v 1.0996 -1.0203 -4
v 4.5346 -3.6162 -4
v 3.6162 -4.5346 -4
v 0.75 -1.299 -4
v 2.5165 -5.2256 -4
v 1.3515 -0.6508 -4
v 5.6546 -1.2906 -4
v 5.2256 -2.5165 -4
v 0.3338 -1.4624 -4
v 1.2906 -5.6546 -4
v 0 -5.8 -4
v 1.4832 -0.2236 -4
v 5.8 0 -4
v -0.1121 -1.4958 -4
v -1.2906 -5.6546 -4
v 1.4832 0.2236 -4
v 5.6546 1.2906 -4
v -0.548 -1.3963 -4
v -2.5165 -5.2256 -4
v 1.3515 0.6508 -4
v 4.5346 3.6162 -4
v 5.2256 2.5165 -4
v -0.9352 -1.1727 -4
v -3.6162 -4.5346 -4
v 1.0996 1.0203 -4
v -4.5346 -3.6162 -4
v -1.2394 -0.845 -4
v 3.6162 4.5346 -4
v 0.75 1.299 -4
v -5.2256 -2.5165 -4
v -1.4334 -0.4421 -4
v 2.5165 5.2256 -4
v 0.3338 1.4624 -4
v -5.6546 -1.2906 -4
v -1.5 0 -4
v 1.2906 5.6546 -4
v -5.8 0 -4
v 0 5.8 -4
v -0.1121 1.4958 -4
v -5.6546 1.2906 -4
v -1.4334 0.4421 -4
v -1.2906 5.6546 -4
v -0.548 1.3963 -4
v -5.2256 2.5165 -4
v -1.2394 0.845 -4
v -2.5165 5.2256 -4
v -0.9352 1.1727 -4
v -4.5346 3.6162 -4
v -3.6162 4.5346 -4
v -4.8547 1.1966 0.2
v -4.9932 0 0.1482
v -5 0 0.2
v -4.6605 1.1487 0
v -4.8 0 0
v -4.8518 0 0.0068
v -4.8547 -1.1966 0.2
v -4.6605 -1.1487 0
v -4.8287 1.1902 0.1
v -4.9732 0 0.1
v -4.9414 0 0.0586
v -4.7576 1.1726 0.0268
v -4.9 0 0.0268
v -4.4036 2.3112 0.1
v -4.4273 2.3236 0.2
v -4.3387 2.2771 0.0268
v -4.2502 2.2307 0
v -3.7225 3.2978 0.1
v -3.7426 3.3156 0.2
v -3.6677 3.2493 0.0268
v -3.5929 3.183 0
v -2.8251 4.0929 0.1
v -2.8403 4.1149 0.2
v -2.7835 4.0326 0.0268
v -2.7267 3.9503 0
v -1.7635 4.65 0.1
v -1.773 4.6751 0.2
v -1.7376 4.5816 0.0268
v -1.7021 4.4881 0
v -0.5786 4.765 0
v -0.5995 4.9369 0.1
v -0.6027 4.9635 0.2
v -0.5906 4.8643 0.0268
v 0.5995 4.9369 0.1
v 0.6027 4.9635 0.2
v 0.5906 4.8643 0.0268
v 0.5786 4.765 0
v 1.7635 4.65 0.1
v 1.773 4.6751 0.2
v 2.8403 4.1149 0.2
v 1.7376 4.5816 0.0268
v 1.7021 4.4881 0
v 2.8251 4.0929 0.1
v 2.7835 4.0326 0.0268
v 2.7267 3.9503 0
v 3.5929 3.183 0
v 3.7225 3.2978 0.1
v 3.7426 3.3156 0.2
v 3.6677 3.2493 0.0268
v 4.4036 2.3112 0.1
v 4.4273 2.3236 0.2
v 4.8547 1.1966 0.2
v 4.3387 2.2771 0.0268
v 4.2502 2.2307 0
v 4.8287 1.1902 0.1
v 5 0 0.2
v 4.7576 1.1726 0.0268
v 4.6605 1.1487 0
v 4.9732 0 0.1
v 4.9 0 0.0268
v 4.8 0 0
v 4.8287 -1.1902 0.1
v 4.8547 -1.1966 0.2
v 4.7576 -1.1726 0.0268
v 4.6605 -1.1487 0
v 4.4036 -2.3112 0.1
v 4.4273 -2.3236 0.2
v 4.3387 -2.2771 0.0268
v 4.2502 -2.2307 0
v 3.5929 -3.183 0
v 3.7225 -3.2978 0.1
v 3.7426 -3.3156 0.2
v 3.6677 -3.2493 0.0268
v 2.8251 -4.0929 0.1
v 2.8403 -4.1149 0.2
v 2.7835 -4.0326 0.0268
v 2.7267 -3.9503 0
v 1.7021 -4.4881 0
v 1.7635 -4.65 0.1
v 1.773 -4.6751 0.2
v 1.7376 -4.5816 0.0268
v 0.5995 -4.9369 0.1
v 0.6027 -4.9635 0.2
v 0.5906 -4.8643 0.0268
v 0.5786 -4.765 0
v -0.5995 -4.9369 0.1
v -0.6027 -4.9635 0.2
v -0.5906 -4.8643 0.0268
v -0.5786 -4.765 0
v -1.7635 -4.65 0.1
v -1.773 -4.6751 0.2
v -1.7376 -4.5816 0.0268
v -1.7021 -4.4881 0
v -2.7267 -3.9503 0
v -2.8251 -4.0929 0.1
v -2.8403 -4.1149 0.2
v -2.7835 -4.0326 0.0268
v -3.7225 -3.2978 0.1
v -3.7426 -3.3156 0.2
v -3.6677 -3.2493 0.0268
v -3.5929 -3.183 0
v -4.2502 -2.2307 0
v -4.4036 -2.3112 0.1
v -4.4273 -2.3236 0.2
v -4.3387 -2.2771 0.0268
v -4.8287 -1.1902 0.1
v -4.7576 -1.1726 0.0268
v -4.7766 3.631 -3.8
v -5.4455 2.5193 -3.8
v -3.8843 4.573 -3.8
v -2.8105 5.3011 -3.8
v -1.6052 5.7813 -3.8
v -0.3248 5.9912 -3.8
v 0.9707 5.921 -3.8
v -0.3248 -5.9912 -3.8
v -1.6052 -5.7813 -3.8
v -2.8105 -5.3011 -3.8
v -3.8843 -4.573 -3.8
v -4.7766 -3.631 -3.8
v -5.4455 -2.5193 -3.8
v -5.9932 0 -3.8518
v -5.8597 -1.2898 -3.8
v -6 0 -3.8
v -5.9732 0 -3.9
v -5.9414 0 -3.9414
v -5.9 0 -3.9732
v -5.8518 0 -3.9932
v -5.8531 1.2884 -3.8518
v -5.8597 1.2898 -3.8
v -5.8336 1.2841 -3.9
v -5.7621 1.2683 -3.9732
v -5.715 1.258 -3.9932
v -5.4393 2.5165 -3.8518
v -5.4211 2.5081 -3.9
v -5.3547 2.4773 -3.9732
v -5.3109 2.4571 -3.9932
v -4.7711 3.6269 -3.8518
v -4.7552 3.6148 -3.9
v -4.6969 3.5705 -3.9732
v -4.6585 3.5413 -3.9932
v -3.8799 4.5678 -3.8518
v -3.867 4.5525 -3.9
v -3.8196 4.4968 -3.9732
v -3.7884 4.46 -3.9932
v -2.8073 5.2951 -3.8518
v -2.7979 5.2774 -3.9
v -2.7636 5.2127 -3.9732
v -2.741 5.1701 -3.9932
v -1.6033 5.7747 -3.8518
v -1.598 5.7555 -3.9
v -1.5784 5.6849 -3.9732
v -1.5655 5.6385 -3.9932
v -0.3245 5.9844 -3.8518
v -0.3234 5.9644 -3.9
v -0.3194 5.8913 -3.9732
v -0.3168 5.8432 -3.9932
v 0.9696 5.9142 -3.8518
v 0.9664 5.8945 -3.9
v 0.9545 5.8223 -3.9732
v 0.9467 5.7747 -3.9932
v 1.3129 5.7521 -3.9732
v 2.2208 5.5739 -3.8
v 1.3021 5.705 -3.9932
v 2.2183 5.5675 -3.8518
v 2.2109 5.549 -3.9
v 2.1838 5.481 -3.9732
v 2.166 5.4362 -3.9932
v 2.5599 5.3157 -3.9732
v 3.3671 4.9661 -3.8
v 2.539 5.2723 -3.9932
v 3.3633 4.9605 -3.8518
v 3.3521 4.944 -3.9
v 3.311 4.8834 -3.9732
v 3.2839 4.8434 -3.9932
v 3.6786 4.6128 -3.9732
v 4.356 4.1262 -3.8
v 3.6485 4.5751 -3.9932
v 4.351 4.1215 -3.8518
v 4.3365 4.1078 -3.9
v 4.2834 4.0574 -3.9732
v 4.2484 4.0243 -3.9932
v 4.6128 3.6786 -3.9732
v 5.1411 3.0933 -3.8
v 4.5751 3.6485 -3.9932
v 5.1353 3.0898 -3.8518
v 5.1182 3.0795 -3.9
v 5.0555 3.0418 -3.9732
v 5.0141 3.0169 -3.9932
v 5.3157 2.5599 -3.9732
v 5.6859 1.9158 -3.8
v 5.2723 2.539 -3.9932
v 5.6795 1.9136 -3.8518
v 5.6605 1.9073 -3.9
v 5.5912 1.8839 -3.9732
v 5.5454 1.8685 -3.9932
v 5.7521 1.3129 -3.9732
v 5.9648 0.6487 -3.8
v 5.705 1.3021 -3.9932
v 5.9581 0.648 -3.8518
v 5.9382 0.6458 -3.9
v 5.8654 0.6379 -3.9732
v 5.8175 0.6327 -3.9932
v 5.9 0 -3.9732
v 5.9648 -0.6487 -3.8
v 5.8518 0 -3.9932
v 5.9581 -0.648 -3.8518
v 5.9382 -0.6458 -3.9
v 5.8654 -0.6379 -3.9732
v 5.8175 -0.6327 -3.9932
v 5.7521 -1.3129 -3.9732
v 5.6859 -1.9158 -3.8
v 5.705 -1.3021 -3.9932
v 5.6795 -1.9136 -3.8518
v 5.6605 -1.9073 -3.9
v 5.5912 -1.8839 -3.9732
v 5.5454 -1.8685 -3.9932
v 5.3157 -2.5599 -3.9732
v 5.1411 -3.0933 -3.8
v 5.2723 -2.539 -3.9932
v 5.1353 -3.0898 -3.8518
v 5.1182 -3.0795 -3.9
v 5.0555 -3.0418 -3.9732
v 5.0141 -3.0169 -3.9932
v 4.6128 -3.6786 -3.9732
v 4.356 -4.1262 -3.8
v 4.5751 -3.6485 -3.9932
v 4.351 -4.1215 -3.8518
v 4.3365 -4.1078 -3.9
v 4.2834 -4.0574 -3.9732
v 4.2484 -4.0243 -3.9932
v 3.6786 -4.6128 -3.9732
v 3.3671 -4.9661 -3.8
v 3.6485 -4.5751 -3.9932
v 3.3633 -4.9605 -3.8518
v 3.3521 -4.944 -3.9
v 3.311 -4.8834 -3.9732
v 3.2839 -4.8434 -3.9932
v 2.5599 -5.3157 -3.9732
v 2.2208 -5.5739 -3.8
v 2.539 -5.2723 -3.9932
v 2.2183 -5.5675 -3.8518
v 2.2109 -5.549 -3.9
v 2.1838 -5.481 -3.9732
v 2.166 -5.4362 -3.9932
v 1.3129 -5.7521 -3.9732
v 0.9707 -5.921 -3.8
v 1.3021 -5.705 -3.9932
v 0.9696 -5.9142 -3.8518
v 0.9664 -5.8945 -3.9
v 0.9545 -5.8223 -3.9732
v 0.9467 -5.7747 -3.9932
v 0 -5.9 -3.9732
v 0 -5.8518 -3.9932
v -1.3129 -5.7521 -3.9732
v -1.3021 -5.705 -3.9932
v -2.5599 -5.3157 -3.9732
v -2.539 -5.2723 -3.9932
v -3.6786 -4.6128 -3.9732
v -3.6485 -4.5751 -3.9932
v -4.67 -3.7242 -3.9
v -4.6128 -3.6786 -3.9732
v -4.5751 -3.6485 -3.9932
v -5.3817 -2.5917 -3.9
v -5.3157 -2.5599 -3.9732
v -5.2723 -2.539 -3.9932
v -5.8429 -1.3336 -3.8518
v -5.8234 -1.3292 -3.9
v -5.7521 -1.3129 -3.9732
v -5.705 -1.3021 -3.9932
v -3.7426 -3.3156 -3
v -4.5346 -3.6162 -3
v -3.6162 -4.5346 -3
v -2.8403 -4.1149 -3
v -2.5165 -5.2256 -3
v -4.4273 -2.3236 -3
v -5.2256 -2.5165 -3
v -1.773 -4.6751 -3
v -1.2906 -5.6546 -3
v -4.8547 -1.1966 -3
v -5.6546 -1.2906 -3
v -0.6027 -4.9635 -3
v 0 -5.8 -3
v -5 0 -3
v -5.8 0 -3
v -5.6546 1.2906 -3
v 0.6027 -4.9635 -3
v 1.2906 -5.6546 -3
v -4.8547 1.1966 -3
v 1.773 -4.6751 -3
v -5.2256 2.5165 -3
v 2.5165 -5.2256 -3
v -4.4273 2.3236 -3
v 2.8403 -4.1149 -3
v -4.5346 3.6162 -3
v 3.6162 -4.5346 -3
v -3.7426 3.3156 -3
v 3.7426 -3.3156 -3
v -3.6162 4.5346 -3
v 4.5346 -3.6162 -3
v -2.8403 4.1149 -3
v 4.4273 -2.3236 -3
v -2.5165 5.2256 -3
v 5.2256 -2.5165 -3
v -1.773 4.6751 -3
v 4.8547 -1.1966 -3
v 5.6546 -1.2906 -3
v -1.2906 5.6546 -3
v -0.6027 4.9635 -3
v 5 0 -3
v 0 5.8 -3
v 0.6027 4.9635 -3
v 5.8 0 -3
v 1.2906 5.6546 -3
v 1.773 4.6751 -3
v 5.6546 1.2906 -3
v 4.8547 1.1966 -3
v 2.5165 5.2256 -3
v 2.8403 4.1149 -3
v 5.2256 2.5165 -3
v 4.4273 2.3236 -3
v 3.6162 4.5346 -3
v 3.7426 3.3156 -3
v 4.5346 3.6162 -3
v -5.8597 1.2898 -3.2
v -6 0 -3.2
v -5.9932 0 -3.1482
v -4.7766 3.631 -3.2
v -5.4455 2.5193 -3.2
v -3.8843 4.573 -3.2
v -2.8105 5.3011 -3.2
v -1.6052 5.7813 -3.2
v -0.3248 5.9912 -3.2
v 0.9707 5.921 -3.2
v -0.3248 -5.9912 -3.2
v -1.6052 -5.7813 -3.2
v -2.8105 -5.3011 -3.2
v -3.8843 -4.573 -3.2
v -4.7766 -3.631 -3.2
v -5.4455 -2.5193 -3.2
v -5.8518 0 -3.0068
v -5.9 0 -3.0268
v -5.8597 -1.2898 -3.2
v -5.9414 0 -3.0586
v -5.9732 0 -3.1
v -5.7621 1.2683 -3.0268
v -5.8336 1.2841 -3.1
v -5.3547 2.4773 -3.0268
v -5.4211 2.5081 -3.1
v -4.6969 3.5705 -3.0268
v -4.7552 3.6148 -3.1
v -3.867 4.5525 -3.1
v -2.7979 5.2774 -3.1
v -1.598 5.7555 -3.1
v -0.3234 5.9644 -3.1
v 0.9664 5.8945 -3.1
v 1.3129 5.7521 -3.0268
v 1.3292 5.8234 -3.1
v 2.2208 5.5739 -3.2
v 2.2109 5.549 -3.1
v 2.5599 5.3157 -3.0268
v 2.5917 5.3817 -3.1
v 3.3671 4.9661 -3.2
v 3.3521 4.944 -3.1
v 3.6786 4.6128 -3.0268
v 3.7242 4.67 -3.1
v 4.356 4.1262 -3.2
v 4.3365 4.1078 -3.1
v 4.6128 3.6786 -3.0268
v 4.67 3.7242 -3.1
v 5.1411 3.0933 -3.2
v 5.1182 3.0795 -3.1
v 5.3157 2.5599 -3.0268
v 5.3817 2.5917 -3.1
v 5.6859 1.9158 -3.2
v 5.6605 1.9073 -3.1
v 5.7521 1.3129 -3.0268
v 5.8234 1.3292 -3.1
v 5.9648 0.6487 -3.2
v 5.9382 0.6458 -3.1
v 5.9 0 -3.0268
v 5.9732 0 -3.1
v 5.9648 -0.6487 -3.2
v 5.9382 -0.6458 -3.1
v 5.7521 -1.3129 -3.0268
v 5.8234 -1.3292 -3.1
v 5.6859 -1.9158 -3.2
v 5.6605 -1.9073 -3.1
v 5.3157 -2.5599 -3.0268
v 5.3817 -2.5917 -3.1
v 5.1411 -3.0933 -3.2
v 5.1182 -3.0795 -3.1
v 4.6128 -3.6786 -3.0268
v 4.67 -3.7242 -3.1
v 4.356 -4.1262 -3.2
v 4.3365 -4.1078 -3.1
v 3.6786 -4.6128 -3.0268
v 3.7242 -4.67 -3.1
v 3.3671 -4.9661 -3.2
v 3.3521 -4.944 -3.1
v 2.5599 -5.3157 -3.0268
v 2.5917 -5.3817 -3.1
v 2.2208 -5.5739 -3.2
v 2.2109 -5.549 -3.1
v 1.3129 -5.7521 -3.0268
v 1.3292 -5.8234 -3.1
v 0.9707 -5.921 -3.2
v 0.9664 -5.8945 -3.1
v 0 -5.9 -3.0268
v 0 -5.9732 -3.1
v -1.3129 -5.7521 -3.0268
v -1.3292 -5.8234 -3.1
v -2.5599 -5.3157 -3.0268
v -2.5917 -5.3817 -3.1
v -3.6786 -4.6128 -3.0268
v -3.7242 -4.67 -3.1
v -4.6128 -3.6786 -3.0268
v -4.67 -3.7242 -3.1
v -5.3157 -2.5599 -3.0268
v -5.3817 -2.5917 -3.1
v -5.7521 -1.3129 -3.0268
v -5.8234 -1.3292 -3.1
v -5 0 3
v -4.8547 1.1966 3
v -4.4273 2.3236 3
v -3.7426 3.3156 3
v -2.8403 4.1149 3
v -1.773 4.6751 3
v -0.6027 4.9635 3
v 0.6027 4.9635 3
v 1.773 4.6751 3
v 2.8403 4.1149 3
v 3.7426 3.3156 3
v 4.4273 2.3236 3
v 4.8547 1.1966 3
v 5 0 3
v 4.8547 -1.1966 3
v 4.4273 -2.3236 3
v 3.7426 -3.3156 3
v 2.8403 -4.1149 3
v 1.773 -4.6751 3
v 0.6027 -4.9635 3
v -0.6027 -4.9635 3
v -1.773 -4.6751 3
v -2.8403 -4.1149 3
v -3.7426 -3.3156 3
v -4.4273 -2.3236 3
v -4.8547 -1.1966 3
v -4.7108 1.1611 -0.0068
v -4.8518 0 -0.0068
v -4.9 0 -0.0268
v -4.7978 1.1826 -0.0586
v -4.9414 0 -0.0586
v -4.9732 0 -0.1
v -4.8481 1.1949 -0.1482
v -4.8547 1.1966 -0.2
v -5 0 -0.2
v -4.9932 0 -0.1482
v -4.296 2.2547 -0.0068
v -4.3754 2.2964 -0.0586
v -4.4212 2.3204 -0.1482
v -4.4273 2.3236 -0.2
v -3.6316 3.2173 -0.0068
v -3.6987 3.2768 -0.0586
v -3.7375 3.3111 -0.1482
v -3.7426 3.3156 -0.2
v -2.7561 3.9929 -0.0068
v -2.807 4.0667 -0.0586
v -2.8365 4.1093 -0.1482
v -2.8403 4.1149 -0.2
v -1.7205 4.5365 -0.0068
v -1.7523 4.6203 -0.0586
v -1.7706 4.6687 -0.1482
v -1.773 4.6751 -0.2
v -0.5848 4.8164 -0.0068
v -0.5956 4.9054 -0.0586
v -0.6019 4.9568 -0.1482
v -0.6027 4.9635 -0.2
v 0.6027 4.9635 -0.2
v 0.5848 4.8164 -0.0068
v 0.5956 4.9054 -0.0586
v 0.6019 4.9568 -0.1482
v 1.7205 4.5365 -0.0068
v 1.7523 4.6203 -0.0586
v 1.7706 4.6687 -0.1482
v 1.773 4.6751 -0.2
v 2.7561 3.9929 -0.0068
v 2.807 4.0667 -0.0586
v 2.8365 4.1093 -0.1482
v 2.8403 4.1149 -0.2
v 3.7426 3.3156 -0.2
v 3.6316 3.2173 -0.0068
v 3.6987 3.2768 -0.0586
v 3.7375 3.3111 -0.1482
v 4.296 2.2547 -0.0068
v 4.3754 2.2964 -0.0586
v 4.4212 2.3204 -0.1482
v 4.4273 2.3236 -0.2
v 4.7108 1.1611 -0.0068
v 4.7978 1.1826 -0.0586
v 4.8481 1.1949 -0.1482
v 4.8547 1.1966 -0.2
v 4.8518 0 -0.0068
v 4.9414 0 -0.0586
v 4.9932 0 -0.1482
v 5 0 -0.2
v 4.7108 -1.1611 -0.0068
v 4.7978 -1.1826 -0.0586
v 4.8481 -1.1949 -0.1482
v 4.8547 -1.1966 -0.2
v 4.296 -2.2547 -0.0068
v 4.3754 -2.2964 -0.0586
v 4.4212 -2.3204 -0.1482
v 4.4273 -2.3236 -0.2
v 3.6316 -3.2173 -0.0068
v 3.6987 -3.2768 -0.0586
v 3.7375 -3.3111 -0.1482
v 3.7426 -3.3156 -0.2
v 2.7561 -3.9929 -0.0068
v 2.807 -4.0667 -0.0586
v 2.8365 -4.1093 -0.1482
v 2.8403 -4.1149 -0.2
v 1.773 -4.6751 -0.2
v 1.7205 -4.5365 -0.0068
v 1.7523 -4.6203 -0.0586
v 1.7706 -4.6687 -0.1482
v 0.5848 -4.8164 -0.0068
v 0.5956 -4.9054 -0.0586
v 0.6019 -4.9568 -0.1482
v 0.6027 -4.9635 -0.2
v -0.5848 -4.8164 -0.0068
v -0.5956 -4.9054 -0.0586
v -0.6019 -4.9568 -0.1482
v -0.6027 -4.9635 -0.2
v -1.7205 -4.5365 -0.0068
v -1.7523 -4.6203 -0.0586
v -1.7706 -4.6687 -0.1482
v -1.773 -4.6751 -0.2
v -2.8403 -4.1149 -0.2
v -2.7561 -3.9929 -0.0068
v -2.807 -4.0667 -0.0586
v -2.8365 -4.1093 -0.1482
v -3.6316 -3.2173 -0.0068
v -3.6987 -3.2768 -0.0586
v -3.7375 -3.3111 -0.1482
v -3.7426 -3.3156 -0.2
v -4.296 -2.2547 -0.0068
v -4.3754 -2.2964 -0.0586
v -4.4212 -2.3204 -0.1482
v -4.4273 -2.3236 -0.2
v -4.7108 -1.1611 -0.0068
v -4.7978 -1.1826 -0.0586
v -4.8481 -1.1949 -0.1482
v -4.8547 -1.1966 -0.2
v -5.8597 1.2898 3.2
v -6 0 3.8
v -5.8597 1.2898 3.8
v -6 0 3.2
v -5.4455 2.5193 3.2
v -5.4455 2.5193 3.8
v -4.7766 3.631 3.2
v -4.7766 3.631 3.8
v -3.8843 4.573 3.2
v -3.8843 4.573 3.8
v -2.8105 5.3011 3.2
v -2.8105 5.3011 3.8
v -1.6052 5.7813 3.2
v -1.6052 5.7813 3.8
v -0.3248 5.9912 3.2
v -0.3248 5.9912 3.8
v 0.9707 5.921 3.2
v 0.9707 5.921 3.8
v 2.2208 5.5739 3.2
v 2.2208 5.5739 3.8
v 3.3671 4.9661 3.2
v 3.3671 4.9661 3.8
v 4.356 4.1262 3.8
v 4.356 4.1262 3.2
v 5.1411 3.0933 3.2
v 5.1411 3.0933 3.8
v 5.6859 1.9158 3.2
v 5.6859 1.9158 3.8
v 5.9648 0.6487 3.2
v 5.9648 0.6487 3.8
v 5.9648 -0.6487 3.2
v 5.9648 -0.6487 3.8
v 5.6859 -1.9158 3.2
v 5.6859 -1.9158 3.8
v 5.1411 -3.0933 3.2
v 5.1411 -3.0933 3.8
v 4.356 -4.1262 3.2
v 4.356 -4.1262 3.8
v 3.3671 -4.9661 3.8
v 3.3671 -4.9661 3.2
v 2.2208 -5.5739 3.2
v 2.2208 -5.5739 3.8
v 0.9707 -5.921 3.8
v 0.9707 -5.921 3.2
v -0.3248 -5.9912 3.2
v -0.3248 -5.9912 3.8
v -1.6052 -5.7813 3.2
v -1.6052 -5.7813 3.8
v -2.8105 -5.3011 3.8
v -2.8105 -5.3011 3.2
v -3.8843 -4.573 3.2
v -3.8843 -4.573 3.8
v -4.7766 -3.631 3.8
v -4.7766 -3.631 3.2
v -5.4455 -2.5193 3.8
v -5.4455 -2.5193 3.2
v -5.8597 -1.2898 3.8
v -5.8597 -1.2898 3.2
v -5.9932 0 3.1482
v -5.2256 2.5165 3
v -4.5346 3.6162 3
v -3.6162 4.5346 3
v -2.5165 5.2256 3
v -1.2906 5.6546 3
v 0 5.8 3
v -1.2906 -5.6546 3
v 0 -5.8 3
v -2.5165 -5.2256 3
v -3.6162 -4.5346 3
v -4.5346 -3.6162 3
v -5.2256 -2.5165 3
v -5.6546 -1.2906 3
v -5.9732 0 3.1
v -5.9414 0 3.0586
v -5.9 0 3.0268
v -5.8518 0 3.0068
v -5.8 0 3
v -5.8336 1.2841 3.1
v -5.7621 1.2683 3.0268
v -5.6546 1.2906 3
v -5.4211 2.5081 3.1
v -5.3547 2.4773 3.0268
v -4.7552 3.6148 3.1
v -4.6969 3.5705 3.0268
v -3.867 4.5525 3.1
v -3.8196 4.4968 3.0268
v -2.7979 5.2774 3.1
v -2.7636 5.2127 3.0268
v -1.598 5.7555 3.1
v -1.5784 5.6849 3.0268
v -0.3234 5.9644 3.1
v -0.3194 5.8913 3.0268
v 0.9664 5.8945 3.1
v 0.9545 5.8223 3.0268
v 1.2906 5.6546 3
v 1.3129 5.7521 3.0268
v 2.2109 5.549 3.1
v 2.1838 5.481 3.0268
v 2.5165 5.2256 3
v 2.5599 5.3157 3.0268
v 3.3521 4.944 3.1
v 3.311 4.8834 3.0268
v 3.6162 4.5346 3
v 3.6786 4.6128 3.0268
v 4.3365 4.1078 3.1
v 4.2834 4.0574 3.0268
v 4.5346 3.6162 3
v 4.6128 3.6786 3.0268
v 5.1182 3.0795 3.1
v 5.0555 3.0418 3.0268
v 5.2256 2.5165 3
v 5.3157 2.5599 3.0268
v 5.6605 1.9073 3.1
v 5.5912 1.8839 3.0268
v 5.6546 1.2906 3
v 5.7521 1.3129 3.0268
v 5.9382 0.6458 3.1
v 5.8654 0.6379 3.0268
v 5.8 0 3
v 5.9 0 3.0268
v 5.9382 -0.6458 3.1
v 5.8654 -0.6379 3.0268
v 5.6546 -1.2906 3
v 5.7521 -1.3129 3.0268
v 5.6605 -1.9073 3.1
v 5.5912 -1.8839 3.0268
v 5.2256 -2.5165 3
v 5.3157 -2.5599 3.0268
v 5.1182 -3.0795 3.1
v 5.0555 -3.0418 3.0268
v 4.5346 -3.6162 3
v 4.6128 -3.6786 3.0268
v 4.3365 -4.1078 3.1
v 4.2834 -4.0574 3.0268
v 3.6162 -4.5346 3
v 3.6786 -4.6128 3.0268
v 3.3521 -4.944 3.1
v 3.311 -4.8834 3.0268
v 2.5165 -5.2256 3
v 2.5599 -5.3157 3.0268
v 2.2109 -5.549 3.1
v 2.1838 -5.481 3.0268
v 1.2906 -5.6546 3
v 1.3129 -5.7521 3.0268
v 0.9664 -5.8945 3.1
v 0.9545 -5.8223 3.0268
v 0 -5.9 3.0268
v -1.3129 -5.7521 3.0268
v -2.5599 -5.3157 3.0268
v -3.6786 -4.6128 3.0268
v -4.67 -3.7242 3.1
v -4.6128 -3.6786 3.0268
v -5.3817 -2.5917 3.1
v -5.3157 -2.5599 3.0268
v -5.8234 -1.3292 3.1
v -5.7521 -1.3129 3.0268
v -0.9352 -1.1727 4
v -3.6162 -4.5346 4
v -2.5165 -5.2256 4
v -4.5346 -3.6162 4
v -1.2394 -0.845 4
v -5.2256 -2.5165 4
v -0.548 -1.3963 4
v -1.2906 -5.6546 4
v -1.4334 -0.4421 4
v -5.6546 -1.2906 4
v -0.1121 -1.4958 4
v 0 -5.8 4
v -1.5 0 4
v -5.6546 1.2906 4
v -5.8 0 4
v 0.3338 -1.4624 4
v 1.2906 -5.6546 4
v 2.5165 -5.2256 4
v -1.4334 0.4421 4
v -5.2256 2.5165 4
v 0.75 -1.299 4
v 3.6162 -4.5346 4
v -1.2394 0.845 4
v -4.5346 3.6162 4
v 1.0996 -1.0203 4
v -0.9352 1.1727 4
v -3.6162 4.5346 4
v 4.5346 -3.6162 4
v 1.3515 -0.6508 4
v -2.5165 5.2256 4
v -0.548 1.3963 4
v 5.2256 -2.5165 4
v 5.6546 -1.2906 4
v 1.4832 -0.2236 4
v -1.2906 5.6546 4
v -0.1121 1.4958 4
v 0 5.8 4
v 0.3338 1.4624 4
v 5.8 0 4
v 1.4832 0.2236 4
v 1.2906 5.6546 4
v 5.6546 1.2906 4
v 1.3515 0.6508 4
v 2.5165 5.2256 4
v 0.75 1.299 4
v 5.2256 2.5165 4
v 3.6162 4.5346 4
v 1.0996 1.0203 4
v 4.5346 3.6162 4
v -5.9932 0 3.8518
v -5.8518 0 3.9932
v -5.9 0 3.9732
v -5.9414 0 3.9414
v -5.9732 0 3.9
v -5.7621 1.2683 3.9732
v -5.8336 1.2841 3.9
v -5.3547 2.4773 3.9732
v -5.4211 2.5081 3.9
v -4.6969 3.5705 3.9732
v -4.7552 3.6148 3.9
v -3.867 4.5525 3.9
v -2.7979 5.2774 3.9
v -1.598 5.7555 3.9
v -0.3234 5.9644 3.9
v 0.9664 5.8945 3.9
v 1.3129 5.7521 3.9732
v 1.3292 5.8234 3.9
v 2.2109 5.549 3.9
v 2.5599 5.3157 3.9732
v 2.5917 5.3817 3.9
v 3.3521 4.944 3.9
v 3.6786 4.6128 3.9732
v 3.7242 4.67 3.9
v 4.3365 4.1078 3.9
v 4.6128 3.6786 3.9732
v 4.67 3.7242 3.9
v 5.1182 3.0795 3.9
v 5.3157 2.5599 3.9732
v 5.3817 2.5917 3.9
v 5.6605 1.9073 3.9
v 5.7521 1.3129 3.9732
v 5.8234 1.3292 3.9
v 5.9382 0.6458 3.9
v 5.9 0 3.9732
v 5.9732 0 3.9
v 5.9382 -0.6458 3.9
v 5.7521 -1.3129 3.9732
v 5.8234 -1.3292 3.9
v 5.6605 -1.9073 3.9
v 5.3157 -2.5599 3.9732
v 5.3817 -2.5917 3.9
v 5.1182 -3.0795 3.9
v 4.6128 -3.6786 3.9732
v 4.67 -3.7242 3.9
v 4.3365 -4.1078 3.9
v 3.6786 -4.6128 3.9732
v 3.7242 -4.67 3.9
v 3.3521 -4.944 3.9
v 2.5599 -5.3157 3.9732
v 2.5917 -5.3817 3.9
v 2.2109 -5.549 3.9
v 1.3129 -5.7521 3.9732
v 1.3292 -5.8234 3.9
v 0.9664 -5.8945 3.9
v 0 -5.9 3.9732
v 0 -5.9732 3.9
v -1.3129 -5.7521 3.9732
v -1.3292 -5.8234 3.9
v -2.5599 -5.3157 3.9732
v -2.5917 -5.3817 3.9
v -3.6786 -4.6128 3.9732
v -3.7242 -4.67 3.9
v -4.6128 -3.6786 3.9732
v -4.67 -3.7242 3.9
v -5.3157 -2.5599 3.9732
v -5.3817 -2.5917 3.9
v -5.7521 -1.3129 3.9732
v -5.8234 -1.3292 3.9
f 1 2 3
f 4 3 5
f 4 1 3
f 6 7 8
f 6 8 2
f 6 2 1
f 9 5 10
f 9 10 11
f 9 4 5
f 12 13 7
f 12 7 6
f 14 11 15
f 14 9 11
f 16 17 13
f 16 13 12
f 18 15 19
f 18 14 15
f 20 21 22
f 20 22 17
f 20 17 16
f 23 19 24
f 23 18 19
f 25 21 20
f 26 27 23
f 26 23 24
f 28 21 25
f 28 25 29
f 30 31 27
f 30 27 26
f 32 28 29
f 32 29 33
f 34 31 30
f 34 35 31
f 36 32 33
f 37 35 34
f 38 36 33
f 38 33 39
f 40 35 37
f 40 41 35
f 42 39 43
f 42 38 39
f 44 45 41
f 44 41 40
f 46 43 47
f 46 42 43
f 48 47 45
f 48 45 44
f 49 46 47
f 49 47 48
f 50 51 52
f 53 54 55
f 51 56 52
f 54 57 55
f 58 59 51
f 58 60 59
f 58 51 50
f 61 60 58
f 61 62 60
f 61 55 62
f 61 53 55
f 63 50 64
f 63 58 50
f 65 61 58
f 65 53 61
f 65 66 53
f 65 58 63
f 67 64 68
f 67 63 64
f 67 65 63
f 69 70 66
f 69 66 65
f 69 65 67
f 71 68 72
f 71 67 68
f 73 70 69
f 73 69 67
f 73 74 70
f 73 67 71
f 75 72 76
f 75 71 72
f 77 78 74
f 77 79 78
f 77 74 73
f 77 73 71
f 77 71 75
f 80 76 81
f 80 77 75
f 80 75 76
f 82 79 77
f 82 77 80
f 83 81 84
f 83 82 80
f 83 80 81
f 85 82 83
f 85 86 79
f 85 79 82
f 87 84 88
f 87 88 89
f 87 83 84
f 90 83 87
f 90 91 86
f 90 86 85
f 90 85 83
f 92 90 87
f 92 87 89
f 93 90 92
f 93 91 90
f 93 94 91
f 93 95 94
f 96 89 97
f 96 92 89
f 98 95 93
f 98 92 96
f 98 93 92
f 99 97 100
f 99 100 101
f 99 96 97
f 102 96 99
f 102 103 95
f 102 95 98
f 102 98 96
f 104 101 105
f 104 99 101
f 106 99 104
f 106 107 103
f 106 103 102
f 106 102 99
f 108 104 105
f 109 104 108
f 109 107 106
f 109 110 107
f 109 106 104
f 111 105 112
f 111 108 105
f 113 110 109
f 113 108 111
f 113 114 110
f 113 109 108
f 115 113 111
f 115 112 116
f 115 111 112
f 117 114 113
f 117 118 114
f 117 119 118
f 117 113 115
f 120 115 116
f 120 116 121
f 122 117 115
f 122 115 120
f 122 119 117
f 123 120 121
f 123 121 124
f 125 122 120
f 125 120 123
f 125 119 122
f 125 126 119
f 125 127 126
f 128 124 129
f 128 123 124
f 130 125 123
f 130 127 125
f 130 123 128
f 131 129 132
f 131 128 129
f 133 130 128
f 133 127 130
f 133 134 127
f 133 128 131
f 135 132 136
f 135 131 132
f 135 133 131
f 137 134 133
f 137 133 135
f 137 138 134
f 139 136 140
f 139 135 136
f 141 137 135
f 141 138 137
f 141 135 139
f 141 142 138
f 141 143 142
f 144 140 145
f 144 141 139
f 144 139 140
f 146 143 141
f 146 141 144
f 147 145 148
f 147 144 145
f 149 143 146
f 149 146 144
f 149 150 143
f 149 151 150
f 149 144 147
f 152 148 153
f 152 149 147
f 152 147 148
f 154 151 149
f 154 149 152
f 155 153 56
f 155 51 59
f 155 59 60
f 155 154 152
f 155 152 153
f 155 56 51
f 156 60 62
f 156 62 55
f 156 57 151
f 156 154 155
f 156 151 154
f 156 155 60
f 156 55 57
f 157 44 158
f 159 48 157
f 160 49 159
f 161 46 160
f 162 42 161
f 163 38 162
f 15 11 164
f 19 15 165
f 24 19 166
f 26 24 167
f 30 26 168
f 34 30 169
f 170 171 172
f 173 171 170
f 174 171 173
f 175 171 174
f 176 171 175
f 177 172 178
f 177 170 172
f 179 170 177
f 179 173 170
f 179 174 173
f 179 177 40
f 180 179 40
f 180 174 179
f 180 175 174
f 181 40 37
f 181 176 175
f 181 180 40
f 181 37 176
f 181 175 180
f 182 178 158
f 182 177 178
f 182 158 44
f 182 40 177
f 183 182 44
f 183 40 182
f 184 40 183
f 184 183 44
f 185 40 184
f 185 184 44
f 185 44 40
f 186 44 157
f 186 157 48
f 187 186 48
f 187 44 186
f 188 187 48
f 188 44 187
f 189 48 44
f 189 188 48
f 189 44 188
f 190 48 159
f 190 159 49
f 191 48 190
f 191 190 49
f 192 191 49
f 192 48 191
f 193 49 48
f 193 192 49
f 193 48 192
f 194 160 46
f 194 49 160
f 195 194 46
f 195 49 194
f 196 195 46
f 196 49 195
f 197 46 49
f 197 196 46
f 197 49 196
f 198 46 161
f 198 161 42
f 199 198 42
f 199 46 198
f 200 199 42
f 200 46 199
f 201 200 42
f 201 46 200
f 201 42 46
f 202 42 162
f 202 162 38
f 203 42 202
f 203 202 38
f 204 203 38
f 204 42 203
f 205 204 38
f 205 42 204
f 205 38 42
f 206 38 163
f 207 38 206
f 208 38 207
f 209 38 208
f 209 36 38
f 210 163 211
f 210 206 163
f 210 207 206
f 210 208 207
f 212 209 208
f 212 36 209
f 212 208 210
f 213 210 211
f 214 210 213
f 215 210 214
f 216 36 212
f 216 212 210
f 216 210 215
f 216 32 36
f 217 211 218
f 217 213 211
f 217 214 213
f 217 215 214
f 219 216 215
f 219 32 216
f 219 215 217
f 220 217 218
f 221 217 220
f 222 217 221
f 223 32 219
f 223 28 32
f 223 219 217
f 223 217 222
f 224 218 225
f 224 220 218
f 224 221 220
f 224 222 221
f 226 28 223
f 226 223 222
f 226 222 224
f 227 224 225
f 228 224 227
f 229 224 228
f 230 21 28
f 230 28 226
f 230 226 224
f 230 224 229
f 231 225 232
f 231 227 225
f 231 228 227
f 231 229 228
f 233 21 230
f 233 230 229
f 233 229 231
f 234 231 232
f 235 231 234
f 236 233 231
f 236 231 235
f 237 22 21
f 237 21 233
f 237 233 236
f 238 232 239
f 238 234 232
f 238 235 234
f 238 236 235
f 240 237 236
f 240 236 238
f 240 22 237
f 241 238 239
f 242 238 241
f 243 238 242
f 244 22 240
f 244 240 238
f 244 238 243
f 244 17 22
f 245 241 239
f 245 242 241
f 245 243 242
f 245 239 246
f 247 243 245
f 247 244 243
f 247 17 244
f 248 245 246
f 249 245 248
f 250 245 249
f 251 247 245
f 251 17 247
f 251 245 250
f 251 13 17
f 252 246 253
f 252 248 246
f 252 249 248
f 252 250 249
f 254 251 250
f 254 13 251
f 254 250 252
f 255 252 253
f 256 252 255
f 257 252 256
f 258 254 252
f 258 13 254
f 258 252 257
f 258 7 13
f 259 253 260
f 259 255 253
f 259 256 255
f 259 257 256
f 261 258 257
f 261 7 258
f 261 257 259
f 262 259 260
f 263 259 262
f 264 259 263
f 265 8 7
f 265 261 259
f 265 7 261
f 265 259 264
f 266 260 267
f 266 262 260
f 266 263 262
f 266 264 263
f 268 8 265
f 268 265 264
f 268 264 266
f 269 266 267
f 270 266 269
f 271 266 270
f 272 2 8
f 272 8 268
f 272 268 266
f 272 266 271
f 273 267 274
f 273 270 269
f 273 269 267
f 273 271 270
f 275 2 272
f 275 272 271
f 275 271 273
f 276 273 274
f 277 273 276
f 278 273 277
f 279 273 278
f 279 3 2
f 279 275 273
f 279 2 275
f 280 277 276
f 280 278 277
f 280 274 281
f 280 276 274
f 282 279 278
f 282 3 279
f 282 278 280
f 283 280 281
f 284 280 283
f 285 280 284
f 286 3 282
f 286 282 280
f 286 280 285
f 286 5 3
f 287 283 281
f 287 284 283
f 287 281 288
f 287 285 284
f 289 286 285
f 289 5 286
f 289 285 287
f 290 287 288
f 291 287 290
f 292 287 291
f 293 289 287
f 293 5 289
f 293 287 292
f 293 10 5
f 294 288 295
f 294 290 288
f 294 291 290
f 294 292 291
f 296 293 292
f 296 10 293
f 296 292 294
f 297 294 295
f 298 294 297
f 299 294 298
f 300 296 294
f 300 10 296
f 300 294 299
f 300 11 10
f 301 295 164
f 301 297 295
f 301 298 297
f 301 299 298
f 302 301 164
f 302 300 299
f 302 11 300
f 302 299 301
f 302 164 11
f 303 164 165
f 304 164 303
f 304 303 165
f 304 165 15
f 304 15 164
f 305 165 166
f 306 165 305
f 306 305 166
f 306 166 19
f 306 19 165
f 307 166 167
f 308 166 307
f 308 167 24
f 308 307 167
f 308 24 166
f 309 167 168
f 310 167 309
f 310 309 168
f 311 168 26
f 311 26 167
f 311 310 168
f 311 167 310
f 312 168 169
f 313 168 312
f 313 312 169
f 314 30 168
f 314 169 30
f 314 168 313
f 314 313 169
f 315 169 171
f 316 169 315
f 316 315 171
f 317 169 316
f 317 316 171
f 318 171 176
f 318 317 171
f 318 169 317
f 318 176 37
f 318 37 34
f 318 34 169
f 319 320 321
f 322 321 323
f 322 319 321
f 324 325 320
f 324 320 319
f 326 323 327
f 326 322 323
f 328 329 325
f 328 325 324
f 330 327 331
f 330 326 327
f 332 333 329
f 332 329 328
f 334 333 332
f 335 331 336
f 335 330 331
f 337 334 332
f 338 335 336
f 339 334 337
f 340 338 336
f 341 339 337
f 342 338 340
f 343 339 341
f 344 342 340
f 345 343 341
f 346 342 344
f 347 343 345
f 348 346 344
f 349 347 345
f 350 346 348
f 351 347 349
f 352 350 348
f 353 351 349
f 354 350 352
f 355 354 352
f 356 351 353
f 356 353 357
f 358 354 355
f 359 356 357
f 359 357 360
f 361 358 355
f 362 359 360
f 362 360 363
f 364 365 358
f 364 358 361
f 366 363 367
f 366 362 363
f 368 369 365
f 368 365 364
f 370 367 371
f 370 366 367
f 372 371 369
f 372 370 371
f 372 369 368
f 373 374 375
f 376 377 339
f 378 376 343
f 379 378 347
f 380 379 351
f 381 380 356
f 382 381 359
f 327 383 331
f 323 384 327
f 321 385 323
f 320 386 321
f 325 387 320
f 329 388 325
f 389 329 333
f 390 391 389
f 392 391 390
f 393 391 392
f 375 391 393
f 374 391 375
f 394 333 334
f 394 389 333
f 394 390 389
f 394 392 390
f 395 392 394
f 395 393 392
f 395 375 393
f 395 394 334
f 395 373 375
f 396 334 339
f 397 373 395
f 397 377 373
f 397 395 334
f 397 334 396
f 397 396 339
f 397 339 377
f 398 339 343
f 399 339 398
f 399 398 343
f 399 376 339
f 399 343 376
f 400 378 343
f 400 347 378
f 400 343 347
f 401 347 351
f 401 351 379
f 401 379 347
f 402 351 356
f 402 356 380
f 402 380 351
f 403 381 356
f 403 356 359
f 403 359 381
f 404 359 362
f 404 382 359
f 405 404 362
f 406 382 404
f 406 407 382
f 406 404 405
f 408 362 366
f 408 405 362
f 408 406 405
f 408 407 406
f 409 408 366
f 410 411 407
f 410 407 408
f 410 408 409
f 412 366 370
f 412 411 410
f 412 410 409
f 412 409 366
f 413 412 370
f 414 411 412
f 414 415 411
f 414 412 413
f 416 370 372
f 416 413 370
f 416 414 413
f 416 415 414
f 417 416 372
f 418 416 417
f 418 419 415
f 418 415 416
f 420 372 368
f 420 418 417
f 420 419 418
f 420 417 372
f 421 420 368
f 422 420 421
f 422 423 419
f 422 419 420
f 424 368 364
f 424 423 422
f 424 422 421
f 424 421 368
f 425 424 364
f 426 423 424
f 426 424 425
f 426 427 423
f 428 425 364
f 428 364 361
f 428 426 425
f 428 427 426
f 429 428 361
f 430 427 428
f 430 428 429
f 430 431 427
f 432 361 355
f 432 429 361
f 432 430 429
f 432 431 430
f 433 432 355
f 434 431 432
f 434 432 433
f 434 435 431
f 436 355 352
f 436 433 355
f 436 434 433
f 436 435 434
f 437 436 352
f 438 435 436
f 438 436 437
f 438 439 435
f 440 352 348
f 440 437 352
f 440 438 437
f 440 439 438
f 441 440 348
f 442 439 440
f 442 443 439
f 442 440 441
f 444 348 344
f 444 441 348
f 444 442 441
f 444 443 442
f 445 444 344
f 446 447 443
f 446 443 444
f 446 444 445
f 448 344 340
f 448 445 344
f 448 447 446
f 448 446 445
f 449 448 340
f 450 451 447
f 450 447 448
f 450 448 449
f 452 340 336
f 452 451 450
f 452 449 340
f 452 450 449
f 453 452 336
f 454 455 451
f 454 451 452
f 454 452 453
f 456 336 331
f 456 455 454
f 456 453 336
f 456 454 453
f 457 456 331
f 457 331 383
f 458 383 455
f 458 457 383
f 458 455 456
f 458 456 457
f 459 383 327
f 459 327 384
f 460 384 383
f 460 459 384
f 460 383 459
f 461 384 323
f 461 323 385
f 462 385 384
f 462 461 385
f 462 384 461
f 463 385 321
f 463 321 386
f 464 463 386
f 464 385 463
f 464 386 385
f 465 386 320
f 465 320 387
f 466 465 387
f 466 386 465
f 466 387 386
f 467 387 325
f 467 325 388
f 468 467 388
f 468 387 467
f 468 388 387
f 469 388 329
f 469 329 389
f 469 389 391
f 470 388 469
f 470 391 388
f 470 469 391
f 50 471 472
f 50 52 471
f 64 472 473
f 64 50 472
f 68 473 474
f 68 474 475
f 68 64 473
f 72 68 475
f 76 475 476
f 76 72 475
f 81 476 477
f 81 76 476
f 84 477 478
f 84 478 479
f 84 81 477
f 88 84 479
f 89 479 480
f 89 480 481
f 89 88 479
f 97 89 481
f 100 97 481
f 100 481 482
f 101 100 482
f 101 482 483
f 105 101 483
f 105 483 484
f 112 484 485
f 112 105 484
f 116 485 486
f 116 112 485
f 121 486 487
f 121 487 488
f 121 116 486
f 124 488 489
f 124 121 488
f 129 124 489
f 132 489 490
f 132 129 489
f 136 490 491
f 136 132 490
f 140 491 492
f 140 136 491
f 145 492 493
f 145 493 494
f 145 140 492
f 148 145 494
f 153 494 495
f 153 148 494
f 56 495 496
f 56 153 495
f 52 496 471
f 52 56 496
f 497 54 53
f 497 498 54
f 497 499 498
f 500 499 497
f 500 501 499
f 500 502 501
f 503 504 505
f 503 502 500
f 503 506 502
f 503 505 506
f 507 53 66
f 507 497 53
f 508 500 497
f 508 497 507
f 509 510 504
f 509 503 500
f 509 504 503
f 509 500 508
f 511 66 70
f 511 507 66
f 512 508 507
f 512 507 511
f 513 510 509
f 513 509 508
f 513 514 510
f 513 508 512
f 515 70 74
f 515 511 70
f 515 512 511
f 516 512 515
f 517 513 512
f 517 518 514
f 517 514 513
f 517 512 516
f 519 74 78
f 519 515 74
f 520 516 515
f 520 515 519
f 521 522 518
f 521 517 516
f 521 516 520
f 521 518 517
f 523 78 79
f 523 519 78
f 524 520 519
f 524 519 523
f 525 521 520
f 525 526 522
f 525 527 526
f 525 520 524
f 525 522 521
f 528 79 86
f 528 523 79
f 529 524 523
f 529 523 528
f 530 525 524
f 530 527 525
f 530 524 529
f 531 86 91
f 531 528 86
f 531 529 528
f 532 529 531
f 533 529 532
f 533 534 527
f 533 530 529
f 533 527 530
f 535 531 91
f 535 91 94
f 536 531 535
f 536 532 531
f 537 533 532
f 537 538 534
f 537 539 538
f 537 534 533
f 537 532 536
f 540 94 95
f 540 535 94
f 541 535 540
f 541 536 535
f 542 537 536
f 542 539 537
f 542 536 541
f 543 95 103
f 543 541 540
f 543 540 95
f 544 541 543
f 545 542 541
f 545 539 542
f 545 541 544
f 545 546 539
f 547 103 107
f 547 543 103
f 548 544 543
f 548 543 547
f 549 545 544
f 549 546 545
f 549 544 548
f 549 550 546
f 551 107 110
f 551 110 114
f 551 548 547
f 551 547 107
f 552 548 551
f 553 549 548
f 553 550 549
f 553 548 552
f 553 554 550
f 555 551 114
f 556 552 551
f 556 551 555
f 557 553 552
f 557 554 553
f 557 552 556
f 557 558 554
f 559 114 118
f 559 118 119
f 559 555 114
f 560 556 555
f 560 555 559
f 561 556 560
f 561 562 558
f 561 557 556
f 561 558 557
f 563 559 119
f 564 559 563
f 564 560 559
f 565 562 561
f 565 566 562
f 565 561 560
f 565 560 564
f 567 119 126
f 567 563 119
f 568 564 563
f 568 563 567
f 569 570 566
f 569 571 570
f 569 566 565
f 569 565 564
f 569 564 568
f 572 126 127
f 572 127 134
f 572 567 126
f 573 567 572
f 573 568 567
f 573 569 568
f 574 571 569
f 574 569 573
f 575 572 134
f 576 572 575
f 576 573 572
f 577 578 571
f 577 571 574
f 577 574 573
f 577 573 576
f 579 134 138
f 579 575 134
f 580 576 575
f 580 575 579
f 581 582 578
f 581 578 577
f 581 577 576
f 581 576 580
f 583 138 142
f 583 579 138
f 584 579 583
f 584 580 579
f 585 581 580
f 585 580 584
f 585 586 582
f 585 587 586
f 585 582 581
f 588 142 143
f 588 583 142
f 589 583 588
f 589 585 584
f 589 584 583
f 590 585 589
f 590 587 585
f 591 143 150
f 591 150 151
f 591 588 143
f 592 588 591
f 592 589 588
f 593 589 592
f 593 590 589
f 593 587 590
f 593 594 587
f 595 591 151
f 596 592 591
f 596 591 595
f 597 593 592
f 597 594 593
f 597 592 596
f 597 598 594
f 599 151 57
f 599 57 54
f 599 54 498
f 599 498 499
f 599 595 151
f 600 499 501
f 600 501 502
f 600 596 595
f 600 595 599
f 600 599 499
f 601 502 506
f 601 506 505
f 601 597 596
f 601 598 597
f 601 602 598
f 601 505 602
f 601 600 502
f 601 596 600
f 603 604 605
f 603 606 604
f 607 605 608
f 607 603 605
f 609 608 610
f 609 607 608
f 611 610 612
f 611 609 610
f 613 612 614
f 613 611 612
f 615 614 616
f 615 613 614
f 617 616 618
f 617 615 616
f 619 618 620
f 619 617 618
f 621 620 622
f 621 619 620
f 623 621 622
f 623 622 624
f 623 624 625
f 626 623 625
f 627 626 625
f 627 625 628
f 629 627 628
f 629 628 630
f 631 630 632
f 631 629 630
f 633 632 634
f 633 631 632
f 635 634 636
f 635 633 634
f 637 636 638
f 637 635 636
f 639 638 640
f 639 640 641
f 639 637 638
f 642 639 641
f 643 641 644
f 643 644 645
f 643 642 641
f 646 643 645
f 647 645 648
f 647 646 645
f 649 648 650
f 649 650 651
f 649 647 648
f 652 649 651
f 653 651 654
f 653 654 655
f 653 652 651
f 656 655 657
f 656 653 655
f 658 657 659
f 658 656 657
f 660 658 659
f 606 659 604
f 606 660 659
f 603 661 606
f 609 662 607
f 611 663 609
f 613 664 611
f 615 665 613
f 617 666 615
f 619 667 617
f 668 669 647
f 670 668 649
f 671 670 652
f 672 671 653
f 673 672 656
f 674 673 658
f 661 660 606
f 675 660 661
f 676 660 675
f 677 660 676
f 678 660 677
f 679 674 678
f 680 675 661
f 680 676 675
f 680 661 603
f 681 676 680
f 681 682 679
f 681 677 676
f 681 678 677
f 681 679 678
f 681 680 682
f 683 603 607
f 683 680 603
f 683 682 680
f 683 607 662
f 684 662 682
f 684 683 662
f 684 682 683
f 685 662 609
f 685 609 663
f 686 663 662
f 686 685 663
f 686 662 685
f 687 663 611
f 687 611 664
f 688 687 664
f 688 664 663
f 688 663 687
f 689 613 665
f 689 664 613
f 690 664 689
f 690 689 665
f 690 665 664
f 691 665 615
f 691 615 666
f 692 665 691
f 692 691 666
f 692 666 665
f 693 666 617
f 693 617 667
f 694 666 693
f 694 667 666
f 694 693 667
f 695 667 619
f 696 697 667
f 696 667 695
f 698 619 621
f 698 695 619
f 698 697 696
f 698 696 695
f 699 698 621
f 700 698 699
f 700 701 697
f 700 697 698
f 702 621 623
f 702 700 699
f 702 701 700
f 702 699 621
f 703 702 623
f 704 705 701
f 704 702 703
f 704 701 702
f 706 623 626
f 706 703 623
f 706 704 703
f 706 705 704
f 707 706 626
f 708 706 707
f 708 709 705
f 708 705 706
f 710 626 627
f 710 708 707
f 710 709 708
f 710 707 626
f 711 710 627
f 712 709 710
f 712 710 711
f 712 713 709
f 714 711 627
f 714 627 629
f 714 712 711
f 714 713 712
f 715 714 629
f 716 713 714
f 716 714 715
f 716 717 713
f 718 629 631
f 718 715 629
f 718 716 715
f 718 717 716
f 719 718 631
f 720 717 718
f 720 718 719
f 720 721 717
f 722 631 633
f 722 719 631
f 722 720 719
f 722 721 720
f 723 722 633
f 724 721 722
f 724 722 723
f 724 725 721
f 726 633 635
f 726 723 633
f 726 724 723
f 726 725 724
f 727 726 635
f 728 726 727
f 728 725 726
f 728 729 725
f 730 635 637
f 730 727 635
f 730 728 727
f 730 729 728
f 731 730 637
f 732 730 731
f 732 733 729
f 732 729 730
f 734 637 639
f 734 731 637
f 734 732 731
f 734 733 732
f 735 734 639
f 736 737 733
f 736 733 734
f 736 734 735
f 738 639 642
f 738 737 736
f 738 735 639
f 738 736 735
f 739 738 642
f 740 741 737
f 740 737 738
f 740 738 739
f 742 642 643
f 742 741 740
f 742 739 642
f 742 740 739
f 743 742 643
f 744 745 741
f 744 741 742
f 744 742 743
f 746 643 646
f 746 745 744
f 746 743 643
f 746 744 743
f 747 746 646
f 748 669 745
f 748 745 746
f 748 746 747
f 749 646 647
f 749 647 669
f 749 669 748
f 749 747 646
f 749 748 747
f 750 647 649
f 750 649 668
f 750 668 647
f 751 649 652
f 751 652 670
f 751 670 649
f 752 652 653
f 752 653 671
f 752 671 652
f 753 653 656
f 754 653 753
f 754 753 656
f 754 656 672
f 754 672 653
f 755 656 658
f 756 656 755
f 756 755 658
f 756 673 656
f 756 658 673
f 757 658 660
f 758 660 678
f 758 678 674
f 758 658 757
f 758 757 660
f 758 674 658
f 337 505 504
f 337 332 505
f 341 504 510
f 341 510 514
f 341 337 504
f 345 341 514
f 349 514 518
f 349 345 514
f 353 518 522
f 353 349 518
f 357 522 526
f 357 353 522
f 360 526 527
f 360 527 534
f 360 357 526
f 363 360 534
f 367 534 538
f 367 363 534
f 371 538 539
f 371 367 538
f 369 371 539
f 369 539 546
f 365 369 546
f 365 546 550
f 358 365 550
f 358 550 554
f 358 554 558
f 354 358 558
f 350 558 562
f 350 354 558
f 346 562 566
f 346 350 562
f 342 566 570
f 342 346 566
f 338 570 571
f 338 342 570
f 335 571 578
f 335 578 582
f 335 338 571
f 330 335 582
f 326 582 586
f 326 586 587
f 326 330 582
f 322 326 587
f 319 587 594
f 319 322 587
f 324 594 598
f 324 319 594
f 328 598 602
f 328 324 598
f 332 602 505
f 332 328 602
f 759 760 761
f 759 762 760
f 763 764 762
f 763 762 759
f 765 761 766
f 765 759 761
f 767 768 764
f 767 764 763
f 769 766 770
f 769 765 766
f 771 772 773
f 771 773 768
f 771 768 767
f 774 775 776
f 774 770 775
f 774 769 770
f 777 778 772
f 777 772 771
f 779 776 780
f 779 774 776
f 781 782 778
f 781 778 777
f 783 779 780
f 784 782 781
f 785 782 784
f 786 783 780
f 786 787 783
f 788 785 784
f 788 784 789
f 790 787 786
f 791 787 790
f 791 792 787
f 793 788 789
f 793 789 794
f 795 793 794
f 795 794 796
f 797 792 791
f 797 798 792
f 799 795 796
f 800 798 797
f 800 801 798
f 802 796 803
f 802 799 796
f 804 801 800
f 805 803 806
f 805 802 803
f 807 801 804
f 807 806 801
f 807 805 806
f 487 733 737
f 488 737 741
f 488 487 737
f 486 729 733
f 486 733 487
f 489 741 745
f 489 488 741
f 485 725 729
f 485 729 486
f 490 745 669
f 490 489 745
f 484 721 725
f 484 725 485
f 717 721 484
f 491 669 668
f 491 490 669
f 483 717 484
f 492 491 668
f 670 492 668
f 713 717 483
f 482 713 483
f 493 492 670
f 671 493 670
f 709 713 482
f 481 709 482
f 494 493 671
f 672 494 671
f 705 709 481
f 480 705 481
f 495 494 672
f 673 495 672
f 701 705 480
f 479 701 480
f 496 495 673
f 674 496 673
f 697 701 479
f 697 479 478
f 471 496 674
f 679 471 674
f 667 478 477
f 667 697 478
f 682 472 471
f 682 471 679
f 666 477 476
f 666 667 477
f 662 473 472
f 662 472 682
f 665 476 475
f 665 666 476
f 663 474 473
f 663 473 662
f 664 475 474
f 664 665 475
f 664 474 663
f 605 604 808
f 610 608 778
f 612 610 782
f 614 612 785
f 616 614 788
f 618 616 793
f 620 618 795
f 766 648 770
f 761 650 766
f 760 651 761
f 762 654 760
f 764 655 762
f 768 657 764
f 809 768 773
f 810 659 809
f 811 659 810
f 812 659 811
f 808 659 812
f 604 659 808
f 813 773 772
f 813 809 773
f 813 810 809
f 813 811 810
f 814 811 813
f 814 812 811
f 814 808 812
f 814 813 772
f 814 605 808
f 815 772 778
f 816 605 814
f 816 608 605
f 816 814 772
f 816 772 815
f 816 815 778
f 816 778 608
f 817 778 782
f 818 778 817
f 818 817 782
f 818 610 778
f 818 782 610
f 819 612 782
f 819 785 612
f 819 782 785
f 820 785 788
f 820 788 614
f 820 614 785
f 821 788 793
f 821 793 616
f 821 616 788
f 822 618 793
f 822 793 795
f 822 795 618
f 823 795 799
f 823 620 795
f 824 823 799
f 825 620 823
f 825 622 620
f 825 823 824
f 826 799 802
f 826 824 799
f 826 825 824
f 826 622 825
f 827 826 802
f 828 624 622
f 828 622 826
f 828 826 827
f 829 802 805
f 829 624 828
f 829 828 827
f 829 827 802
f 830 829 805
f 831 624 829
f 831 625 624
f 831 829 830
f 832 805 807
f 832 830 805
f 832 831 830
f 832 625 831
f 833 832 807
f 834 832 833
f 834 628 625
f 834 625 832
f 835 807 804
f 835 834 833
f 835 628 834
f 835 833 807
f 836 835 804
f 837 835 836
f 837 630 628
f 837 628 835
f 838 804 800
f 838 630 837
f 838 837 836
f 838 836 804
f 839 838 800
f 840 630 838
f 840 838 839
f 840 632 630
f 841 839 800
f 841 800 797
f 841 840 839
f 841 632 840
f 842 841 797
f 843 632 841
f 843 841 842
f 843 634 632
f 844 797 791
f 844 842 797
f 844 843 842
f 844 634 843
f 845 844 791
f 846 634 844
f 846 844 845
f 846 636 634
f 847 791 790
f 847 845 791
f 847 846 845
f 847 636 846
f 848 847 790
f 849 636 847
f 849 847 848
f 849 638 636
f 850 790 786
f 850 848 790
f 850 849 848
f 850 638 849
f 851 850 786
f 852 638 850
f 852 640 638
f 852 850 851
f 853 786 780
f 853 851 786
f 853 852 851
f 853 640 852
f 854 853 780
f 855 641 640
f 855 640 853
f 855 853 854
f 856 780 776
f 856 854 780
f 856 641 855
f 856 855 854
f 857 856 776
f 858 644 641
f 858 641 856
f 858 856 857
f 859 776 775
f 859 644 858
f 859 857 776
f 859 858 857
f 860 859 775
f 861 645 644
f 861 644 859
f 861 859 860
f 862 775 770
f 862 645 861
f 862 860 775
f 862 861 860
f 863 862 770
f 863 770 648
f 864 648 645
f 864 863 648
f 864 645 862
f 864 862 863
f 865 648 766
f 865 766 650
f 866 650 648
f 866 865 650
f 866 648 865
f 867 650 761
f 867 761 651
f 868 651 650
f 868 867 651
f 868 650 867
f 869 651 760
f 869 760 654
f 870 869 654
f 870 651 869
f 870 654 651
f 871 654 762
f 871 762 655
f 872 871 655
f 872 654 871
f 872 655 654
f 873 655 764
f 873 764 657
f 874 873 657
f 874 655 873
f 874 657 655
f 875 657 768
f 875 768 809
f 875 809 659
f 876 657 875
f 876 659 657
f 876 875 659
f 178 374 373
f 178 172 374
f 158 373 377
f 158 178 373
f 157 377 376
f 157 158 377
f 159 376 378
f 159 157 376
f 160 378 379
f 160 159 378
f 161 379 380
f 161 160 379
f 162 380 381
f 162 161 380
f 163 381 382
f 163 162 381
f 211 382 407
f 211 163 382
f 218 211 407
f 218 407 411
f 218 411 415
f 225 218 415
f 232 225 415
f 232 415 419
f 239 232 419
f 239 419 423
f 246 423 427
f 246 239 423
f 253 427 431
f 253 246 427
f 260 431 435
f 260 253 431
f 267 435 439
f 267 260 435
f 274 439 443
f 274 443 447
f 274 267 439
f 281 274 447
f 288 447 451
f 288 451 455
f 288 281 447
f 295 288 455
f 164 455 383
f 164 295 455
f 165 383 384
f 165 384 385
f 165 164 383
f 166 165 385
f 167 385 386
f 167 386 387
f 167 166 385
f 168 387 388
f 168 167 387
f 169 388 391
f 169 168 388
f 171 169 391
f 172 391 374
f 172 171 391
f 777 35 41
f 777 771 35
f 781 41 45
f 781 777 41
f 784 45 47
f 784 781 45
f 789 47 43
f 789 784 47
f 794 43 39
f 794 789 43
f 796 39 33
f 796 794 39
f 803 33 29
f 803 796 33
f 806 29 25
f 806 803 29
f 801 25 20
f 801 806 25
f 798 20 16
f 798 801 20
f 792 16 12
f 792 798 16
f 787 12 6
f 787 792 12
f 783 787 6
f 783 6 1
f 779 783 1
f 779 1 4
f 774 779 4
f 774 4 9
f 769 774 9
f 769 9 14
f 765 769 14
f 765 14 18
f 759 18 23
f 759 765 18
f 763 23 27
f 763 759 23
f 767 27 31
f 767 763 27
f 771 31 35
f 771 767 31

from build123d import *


with BuildPart() as f1:
    # F0 (on Front) → F1 (revolve)
    with BuildSketch(Plane.XZ):
        with BuildLine():
            Line((-4.8, 0), (-1.5, 0))
            Line((-1.5, 0), (-1.5, 4))
            Line((-1.5, 4), (-5.8, 4))
            ThreePointArc((-5.8, 4), (-5.941421, 3.941421), (-6, 3.8))
            Line((-6, 3.8), (-6, 3.2))
            ThreePointArc((-6, 3.2), (-5.941421, 3.058579), (-5.8, 3))
            Line((-5.8, 3), (-5, 3))
            Line((-5, 3), (-5, 0.2))
            ThreePointArc((-5, 0.2), (-4.941421, 0.058579), (-4.8, 0))
        make_face()
        with BuildLine():
            Line((-1.5, -4), (-1.5, 0))
            Line((-1.5, 0), (-4.8, 0))
            ThreePointArc((-4.8, 0), (-4.941421, -0.058579), (-5, -0.2))
            Line((-5, -0.2), (-5, -3))
            Line((-5, -3), (-5.8, -3))
            ThreePointArc((-5.8, -3), (-5.941421, -3.058579), (-6, -3.2))
            Line((-6, -3.2), (-6, -3.8))
            ThreePointArc((-6, -3.8), (-5.941421, -3.941421), (-5.8, -4))
            Line((-5.8, -4), (-1.5, -4))
        make_face()
    revolve(axis=Axis((0, 0, -2), (0, 0, -1)))


solid = f1.part
